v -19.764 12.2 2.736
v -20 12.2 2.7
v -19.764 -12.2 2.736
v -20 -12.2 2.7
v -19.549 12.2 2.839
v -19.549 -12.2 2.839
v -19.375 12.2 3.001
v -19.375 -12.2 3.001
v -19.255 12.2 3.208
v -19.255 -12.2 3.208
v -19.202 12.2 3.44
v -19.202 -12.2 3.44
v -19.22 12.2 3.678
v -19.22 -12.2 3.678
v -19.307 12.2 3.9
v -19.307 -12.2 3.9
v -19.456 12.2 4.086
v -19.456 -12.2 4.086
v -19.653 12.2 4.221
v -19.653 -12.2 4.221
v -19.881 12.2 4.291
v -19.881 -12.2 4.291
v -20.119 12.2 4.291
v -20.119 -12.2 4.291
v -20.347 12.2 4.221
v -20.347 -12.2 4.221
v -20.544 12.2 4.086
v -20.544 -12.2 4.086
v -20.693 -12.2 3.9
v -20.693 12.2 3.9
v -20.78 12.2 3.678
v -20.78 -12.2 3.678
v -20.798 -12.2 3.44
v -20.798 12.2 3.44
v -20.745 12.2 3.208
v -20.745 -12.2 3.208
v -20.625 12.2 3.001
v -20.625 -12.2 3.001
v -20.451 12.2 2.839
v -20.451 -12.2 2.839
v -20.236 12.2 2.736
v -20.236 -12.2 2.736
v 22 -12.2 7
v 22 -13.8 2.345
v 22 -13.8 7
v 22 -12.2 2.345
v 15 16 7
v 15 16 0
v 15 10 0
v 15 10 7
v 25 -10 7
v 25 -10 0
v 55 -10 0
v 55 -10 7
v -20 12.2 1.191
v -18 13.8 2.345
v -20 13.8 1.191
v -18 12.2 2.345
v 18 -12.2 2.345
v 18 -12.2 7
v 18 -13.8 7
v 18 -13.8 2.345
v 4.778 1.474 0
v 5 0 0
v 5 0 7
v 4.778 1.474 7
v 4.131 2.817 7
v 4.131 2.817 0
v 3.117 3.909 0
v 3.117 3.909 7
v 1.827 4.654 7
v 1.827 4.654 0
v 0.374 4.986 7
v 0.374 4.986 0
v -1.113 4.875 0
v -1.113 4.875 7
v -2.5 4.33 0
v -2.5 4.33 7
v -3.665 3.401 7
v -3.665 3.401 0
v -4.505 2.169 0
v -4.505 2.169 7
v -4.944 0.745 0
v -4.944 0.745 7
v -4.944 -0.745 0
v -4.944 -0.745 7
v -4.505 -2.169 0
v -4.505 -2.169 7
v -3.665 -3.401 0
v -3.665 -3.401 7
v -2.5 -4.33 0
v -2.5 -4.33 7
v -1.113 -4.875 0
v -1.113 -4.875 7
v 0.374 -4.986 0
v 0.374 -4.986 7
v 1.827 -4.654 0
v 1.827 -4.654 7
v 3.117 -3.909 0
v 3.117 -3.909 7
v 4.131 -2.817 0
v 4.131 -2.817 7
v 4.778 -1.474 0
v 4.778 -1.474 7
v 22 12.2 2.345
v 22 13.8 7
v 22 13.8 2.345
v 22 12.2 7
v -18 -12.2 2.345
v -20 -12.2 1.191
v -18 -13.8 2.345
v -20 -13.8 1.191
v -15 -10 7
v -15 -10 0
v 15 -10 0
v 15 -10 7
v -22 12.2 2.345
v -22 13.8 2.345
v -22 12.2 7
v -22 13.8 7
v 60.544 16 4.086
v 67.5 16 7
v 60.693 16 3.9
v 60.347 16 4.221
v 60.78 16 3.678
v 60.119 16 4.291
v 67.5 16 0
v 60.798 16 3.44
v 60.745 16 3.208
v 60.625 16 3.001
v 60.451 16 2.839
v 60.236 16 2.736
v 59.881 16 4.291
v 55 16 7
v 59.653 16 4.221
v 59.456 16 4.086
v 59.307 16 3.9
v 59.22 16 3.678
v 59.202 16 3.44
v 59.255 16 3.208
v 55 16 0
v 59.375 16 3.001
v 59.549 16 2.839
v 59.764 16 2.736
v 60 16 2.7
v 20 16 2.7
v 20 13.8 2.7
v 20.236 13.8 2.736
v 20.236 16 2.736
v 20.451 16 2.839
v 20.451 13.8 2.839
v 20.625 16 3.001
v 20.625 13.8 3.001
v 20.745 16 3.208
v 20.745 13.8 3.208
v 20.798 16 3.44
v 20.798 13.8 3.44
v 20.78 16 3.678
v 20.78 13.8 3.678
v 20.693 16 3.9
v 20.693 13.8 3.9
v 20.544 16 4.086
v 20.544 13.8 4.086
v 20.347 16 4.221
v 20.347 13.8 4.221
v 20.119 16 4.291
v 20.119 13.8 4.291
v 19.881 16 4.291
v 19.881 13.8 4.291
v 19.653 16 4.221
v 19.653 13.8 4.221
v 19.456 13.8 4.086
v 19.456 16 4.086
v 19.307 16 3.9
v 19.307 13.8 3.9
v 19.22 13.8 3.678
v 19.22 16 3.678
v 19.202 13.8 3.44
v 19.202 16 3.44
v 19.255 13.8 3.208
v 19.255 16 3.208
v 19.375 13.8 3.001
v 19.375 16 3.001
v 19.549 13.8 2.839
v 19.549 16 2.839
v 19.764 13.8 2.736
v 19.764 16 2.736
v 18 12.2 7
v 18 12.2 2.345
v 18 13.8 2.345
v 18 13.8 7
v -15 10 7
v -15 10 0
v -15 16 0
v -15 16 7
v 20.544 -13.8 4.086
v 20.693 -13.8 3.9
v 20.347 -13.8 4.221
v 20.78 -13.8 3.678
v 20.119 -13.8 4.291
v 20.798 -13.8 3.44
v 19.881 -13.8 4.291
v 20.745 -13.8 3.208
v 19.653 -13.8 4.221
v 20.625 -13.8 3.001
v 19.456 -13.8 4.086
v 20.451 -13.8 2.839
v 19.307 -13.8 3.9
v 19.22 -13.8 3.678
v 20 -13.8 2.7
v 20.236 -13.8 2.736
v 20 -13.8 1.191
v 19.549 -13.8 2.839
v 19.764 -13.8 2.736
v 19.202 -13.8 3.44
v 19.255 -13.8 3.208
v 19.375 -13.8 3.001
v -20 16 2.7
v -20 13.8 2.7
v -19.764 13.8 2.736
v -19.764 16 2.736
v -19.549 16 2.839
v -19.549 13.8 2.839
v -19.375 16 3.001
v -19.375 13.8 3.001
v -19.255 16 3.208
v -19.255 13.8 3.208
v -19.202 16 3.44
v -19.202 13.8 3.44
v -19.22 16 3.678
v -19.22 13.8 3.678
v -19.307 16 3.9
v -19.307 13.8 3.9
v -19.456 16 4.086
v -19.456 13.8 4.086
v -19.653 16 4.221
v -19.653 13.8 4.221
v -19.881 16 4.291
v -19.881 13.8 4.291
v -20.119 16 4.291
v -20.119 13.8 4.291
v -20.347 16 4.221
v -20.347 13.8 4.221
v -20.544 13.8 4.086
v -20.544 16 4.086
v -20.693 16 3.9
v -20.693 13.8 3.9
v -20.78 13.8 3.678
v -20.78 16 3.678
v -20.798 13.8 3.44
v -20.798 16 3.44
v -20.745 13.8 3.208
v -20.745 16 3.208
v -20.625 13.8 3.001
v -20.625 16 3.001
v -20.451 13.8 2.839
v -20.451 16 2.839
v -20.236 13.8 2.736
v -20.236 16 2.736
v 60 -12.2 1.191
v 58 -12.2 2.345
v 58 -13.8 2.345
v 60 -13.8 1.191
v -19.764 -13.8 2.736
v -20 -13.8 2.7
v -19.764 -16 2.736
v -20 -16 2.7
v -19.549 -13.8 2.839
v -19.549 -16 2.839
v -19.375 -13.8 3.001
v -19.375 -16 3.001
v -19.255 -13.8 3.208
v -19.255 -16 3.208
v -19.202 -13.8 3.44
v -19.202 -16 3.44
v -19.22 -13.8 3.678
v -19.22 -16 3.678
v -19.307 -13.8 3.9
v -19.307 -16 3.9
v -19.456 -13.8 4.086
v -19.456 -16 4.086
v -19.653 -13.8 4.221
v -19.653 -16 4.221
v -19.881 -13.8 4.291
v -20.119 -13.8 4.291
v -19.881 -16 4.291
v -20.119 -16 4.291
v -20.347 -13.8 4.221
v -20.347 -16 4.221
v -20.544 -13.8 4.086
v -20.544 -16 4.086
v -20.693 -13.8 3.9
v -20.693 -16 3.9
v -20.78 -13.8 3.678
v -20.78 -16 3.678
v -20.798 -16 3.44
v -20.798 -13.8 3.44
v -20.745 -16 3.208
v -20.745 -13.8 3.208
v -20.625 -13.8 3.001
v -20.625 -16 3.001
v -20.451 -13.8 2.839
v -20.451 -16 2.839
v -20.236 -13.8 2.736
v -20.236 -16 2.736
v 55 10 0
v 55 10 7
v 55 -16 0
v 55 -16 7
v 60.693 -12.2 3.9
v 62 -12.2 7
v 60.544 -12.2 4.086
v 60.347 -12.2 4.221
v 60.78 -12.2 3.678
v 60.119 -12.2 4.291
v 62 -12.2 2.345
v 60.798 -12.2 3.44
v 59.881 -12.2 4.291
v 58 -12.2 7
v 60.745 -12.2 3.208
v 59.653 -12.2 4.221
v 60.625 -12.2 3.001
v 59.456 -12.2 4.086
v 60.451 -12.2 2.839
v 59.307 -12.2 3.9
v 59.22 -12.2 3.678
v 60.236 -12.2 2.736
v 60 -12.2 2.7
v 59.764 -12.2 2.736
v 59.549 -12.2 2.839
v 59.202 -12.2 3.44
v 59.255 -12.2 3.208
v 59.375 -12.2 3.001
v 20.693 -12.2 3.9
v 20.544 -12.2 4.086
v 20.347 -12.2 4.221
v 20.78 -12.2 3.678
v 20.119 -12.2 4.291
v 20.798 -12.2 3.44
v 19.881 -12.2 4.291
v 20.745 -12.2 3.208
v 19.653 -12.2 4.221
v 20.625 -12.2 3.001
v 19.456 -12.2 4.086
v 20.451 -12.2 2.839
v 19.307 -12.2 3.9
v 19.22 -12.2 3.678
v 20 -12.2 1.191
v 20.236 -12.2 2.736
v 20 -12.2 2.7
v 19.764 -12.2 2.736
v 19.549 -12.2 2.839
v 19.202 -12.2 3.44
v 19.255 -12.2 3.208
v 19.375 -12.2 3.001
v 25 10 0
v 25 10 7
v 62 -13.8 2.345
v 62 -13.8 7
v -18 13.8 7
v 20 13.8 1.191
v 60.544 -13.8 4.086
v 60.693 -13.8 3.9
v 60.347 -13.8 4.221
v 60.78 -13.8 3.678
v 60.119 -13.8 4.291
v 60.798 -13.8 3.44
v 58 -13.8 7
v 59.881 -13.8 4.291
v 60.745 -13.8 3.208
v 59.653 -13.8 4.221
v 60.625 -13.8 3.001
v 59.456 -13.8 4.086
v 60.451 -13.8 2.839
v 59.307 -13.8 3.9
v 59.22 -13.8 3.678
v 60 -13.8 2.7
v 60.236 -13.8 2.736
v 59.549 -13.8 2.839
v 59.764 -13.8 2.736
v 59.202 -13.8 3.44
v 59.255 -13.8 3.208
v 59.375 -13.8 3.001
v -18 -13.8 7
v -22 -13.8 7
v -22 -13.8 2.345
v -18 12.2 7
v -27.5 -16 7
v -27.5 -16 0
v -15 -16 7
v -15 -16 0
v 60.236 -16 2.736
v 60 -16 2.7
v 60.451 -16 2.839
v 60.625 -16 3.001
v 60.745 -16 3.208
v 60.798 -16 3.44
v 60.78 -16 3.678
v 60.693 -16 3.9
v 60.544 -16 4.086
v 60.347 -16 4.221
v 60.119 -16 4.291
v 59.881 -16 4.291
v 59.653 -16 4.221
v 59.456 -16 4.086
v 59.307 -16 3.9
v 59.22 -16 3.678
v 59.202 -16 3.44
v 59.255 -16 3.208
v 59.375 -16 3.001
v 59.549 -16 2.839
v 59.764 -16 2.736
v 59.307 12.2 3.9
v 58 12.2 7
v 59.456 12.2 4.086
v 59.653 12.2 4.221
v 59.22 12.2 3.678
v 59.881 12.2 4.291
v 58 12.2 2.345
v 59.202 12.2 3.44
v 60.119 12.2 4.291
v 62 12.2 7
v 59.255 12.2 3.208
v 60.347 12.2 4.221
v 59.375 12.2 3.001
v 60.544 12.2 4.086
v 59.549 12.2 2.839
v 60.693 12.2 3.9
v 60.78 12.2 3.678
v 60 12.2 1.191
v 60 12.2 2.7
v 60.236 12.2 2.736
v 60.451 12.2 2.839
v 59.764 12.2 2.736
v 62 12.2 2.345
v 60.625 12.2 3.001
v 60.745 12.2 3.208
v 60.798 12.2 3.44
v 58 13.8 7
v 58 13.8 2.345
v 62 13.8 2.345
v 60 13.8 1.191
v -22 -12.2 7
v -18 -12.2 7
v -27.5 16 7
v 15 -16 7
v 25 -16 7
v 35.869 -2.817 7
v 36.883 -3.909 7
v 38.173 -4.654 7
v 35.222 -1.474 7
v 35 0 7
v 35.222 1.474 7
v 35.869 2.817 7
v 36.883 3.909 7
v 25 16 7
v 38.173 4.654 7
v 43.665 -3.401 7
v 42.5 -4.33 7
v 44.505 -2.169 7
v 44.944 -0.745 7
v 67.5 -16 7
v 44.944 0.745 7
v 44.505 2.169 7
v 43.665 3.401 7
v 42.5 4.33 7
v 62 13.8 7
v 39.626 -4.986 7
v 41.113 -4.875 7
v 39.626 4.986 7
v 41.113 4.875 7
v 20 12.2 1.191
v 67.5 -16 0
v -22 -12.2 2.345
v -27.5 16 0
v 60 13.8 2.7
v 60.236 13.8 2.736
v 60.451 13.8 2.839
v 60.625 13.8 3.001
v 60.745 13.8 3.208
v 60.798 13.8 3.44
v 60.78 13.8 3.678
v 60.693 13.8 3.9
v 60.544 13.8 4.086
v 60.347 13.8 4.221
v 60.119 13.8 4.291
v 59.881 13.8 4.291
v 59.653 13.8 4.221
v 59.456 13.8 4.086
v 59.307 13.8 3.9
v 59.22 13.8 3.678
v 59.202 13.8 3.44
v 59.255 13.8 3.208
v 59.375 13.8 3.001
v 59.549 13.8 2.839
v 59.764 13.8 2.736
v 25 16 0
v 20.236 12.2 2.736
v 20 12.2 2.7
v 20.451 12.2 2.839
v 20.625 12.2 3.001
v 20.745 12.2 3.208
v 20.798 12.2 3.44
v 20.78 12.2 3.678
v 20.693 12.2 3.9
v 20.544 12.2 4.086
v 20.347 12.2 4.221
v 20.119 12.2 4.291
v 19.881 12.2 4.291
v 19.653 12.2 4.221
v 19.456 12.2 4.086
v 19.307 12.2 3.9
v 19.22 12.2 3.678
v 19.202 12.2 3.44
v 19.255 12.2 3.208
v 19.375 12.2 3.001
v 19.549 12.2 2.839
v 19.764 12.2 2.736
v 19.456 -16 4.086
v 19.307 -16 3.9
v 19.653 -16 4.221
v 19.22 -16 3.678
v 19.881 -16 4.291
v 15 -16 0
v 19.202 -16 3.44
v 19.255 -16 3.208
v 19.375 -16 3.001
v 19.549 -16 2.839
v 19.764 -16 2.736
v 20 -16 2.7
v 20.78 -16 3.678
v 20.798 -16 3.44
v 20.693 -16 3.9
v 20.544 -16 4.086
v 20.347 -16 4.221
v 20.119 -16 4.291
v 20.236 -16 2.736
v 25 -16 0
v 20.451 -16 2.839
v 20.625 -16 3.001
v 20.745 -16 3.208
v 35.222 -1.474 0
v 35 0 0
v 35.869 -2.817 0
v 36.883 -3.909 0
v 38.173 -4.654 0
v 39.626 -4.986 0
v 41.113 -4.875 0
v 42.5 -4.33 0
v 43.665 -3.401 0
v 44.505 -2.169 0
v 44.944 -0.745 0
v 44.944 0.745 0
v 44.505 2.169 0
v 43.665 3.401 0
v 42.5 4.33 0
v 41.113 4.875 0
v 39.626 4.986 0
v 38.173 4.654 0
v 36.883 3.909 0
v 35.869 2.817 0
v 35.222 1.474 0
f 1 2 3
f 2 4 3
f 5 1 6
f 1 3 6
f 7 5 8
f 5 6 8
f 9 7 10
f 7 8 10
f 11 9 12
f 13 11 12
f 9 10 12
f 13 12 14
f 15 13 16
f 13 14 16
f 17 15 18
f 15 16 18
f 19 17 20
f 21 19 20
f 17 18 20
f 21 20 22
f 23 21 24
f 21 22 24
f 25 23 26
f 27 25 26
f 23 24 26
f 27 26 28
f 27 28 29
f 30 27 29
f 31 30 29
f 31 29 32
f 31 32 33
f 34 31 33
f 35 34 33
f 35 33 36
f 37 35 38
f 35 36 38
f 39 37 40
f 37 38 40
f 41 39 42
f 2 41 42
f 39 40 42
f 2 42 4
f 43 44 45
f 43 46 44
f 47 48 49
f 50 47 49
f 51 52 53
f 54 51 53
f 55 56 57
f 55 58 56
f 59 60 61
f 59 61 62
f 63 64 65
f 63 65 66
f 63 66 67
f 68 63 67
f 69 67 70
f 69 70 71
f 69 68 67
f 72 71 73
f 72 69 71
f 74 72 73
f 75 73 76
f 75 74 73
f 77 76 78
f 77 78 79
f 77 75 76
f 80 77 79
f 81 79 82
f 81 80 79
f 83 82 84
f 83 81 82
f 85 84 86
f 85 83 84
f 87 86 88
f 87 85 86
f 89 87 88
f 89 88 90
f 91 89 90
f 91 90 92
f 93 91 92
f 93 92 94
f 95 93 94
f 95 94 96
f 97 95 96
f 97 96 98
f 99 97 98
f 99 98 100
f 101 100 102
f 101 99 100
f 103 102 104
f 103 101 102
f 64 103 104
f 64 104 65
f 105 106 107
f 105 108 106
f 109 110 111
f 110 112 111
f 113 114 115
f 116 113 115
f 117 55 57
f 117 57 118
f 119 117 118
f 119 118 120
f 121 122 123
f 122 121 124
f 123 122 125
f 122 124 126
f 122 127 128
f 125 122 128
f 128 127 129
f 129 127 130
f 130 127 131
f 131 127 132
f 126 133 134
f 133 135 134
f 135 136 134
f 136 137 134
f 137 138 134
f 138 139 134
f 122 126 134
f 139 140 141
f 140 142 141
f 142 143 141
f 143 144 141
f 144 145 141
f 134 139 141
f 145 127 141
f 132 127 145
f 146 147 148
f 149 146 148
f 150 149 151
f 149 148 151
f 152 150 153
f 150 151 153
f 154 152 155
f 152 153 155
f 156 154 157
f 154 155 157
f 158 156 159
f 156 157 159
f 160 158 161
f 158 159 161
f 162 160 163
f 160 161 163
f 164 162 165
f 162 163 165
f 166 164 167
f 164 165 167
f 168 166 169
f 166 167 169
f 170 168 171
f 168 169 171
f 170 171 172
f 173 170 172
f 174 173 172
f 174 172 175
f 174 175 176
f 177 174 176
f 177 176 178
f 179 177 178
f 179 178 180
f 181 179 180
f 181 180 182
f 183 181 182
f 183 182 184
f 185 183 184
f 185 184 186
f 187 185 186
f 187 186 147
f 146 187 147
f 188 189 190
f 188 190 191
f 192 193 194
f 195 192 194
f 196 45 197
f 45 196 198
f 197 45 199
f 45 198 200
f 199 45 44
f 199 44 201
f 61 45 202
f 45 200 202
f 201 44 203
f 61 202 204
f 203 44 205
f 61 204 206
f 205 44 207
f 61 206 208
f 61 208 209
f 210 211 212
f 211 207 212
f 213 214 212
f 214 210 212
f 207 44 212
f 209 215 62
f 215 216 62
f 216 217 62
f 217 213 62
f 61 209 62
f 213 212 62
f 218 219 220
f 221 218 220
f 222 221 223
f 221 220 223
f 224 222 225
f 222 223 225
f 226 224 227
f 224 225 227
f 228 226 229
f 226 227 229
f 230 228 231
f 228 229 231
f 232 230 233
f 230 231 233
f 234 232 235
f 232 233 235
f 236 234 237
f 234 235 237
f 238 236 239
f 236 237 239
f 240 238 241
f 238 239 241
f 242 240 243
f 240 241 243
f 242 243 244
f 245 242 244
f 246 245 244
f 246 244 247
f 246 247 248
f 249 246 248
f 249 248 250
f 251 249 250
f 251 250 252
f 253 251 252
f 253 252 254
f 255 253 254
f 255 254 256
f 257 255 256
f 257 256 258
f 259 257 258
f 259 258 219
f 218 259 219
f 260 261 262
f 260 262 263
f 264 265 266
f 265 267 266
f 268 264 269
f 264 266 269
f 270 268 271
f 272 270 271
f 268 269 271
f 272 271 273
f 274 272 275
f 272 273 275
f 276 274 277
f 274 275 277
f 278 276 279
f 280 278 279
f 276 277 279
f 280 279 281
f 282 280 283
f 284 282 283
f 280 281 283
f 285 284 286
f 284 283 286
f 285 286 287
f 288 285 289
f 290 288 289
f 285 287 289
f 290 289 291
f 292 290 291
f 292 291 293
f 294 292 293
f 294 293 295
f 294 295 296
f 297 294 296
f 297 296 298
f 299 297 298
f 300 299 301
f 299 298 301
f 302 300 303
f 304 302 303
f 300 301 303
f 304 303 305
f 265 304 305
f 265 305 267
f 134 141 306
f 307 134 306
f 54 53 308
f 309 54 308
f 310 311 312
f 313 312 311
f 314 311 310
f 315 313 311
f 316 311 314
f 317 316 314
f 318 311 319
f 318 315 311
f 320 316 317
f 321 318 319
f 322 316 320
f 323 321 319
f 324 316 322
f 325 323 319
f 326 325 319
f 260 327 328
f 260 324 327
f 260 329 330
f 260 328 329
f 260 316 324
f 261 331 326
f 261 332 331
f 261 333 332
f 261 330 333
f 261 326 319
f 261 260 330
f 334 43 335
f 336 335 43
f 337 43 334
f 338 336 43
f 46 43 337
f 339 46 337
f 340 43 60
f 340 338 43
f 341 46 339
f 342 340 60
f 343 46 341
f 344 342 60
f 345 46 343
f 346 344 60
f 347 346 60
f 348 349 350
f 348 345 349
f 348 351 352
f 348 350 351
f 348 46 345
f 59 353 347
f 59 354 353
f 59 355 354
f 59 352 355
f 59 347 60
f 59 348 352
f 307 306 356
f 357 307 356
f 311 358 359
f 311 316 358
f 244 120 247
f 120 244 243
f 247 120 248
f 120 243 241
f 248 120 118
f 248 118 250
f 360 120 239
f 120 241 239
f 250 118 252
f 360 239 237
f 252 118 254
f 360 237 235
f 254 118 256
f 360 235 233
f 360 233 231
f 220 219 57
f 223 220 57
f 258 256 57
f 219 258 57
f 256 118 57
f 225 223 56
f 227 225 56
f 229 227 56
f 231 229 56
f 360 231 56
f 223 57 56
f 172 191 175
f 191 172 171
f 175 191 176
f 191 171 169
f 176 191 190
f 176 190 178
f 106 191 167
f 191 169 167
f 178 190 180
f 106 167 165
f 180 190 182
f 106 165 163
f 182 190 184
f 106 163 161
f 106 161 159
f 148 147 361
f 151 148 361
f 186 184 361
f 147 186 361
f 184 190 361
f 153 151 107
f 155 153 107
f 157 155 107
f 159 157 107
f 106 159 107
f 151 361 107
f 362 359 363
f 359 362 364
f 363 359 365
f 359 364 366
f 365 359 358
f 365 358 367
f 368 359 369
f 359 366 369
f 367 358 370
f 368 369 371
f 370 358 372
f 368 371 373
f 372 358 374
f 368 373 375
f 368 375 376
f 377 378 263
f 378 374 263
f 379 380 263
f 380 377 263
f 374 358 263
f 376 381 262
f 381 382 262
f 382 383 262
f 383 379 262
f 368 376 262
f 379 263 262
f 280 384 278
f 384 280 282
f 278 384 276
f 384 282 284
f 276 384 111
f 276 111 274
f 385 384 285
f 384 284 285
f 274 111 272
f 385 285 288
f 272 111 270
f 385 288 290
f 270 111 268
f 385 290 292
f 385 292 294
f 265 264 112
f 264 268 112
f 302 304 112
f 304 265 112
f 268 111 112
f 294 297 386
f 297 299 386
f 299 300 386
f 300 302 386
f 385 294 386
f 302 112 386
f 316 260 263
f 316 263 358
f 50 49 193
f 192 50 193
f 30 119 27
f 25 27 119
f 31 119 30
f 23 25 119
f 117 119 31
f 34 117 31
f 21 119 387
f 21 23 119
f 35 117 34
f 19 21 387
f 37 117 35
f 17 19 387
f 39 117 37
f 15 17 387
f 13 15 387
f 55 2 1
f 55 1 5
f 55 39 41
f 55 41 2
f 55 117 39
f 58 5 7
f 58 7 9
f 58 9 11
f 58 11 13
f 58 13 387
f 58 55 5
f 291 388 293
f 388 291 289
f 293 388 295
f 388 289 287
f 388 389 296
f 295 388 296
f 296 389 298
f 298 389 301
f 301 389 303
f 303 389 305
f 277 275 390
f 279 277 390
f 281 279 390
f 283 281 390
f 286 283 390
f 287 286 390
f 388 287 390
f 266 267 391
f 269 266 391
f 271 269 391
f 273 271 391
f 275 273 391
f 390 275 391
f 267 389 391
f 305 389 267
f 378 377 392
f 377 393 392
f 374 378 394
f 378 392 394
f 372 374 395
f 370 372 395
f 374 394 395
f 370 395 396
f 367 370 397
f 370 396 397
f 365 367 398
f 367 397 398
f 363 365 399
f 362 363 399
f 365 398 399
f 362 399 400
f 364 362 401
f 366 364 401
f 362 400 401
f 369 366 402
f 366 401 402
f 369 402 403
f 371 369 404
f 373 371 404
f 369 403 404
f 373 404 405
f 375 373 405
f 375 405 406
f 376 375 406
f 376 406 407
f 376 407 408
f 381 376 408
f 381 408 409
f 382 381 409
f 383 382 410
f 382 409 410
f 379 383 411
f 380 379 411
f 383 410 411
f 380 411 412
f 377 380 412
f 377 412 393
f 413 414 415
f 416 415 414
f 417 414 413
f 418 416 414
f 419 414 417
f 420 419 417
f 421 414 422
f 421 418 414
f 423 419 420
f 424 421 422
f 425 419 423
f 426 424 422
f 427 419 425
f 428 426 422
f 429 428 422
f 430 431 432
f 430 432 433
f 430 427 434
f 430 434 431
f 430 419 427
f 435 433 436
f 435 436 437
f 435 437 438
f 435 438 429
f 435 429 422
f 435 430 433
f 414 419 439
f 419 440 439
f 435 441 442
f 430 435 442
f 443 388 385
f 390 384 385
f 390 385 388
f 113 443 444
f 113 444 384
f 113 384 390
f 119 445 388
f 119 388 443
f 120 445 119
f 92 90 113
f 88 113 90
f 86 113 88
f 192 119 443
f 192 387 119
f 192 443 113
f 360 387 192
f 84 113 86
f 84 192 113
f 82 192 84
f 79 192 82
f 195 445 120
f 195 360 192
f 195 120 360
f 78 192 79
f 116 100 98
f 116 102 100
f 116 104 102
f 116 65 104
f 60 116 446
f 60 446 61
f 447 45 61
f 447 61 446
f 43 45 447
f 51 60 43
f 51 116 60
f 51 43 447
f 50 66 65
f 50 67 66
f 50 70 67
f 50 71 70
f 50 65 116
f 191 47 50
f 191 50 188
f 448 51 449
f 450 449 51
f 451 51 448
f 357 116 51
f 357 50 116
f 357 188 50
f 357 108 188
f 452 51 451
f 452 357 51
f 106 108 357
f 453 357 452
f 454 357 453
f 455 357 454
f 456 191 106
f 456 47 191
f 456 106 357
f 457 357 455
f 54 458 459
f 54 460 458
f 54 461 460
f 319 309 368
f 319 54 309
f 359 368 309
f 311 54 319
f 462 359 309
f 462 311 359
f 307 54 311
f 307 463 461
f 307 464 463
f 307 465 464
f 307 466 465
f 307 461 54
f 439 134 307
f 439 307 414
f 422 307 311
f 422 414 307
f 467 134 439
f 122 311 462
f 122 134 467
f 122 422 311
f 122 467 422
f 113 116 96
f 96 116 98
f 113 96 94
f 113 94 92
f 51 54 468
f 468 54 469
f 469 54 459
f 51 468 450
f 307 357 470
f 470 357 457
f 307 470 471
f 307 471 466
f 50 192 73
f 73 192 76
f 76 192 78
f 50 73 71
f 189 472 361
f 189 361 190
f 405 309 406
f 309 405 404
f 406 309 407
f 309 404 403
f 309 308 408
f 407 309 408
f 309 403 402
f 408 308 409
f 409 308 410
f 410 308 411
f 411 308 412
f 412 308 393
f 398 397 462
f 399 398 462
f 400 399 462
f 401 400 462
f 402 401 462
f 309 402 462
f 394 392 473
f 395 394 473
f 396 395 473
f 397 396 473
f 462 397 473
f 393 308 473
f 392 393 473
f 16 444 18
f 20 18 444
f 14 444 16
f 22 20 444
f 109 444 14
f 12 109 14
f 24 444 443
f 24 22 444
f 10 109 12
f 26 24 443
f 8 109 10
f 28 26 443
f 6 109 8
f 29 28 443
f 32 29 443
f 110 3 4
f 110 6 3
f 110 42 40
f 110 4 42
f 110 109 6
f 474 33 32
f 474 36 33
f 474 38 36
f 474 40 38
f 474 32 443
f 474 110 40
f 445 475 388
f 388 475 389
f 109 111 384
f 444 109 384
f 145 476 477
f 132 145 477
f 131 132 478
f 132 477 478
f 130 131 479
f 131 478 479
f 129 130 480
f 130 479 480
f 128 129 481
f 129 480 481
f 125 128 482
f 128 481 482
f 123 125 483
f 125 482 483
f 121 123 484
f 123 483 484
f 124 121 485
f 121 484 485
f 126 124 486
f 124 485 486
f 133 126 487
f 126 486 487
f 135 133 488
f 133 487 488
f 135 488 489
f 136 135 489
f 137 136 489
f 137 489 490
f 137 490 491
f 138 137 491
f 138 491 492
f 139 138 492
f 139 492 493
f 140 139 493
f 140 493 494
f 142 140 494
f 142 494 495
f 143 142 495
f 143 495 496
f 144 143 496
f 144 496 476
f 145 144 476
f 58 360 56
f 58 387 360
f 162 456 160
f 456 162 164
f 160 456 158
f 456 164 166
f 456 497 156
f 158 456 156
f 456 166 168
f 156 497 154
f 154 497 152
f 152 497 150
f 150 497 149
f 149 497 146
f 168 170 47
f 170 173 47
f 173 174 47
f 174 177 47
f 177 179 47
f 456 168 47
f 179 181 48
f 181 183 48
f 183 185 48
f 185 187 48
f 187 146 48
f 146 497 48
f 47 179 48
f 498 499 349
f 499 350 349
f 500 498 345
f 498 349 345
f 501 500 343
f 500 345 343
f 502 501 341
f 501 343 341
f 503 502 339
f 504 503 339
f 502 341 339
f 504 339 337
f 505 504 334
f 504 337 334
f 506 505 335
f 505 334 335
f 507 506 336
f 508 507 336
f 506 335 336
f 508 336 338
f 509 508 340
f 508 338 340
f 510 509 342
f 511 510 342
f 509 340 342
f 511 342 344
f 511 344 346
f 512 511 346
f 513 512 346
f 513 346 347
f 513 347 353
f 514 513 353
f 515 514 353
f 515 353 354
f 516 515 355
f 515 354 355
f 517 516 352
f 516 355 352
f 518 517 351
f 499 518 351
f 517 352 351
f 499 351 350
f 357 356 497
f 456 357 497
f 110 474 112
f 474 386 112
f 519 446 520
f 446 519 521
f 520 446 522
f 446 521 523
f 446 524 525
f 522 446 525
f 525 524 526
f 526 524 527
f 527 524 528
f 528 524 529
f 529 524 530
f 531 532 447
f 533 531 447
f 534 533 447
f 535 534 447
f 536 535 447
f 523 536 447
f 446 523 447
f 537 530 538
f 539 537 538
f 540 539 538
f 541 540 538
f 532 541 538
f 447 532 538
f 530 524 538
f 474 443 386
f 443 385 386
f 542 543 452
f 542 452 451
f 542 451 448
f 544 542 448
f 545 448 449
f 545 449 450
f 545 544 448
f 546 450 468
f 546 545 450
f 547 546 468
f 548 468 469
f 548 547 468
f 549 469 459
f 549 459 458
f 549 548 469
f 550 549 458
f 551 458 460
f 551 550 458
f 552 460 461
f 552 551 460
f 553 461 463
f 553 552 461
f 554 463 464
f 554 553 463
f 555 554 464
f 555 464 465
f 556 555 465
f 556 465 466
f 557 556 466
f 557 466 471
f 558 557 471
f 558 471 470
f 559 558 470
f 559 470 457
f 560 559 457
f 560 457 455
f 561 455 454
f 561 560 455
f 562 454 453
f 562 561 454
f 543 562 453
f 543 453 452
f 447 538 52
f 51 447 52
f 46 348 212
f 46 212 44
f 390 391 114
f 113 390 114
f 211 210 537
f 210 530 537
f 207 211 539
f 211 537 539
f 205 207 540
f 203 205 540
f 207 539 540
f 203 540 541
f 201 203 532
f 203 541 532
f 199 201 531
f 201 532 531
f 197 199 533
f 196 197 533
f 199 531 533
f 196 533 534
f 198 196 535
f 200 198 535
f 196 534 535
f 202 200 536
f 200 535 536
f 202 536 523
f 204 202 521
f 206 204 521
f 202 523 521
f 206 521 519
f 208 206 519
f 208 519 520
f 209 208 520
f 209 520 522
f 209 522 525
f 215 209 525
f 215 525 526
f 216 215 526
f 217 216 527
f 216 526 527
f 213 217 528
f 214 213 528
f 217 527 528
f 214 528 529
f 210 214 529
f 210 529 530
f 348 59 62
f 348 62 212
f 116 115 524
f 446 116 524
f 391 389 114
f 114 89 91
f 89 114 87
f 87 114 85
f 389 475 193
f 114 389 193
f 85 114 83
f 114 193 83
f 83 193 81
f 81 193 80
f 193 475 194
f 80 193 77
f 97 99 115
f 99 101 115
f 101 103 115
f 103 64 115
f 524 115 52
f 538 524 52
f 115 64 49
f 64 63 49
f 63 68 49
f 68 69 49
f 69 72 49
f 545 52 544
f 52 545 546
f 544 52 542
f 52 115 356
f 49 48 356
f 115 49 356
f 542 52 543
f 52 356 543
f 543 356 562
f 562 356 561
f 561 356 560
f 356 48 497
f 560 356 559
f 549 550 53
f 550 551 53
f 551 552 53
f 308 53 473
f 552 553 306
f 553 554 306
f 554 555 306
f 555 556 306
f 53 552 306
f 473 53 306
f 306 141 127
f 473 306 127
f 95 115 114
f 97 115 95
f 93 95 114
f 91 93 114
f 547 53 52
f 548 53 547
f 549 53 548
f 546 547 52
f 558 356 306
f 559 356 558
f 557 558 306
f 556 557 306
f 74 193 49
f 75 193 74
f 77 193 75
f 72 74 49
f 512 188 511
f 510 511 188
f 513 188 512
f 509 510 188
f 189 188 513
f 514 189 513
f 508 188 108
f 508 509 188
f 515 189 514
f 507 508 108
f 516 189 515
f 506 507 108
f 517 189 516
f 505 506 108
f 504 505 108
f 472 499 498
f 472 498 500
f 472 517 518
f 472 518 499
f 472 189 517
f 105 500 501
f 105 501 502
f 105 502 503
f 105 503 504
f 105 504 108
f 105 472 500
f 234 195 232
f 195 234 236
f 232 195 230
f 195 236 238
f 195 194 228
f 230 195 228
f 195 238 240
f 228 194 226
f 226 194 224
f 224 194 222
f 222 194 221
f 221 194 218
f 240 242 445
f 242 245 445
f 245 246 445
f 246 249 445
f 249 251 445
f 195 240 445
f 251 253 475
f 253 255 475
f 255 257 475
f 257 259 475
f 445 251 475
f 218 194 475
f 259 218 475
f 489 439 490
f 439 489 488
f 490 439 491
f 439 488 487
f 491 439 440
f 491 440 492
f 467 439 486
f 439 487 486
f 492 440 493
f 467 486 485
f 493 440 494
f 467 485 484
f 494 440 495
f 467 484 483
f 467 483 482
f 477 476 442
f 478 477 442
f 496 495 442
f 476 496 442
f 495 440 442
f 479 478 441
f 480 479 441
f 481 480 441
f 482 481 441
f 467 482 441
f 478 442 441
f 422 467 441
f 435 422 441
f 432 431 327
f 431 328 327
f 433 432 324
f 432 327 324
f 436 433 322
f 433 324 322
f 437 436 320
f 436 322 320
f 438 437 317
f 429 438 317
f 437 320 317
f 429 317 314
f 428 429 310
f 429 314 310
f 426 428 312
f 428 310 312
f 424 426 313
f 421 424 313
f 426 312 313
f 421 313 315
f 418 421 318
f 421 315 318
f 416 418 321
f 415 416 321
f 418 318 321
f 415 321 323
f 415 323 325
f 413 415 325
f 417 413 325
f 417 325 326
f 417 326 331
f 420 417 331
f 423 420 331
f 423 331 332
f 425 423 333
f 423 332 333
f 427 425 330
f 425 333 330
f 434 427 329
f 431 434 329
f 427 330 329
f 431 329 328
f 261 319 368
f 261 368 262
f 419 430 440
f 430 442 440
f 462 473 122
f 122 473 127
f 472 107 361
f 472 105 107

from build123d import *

# Parameters (mm, degrees)
SKETCH_1_R          = 5
EXTRUDE_1_DEPTH     = 7
M2X0_4_1_D          = 1.6
CUT_EXTRUDE_1_DEPTH = 0.8
CUT_EXTRUDE_2_DEPTH = 0.8


with BuildPart() as part:
    # 草图1 → 凸台-拉伸1 (new body)
    with BuildSketch(Plane.XY):
        Polygon((-15, 10), (-15, 16), (-27.5, 16), (-27.5, -16), (-15, -16), (-15, -10), (15, -10), (15, -16), (25, -16), (25, -10), (55, -10), (55, -16), (67.5, -16), (67.5, 16), (55, 16), (55, 10), (25, 10), (25, 16), (15, 16), (15, 10), align=None)
        Circle(SKETCH_1_R, mode=Mode.SUBTRACT)
        with Locations(Location((40, 0, 0), (0, 0, 180))):
            Circle(SKETCH_1_R, mode=Mode.SUBTRACT)
    extrude(amount=EXTRUDE_1_DEPTH)

    # M2x0.4 螺纹孔1 (through all)
    with Locations(Plane(origin=(-20, 16, 3.5), x_dir=(0, 0, 1), z_dir=(0, 1, 0))):
        with Locations((0, 0), (0, 40), (0, 80)):
            Hole(M2X0_4_1_D / 2)

    # 草图4 → 切除-拉伸1 (cut, symmetric)
    with BuildSketch(Plane(origin=(0, 13, 0), x_dir=(1, 0, 0), z_dir=(0, 1, 0))):
        Polygon((-22, -4.654700538), (-22, -7), (-18, -7), (-18, -4.654700538), (-18, -2.345299462), (-20, -1.190598923), (-22, -2.345299462), align=None)
        Polygon((18, -4.654700538), (18, -7), (22, -7), (22, -4.654700538), (22, -2.345299462), (20, -1.190598923), (18, -2.345299462), align=None)
        Polygon((58, -4.654700538), (58, -7), (62, -7), (62, -4.654700538), (62, -2.345299462), (60, -1.190598923), (58, -2.345299462), align=None)
    extrude(amount=CUT_EXTRUDE_1_DEPTH, both=True, mode=Mode.SUBTRACT)

    # 草图5 → 切除-拉伸2 (cut, symmetric)
    with BuildSketch(Plane(origin=(0, -13, 0), x_dir=(-1, 0, 0), z_dir=(0, -1, 0))):
        Polygon((-20, -1.190598923), (-22, -2.345299462), (-22, -4.654700538), (-22, -7), (-18, -7), (-18, -4.654700538), (-18, -2.345299462), align=None)
        Polygon((-60, -1.190598923), (-62, -2.345299462), (-62, -4.654700538), (-62, -7), (-58, -7), (-58, -4.654700538), (-58, -2.345299462), align=None)
        Polygon((20, -1.190598923), (18, -2.345299462), (18, -4.654700538), (18, -7), (22, -7), (22, -4.654700538), (22, -2.345299462), align=None)
    extrude(amount=CUT_EXTRUDE_2_DEPTH, both=True, mode=Mode.SUBTRACT)


solid = part.part
